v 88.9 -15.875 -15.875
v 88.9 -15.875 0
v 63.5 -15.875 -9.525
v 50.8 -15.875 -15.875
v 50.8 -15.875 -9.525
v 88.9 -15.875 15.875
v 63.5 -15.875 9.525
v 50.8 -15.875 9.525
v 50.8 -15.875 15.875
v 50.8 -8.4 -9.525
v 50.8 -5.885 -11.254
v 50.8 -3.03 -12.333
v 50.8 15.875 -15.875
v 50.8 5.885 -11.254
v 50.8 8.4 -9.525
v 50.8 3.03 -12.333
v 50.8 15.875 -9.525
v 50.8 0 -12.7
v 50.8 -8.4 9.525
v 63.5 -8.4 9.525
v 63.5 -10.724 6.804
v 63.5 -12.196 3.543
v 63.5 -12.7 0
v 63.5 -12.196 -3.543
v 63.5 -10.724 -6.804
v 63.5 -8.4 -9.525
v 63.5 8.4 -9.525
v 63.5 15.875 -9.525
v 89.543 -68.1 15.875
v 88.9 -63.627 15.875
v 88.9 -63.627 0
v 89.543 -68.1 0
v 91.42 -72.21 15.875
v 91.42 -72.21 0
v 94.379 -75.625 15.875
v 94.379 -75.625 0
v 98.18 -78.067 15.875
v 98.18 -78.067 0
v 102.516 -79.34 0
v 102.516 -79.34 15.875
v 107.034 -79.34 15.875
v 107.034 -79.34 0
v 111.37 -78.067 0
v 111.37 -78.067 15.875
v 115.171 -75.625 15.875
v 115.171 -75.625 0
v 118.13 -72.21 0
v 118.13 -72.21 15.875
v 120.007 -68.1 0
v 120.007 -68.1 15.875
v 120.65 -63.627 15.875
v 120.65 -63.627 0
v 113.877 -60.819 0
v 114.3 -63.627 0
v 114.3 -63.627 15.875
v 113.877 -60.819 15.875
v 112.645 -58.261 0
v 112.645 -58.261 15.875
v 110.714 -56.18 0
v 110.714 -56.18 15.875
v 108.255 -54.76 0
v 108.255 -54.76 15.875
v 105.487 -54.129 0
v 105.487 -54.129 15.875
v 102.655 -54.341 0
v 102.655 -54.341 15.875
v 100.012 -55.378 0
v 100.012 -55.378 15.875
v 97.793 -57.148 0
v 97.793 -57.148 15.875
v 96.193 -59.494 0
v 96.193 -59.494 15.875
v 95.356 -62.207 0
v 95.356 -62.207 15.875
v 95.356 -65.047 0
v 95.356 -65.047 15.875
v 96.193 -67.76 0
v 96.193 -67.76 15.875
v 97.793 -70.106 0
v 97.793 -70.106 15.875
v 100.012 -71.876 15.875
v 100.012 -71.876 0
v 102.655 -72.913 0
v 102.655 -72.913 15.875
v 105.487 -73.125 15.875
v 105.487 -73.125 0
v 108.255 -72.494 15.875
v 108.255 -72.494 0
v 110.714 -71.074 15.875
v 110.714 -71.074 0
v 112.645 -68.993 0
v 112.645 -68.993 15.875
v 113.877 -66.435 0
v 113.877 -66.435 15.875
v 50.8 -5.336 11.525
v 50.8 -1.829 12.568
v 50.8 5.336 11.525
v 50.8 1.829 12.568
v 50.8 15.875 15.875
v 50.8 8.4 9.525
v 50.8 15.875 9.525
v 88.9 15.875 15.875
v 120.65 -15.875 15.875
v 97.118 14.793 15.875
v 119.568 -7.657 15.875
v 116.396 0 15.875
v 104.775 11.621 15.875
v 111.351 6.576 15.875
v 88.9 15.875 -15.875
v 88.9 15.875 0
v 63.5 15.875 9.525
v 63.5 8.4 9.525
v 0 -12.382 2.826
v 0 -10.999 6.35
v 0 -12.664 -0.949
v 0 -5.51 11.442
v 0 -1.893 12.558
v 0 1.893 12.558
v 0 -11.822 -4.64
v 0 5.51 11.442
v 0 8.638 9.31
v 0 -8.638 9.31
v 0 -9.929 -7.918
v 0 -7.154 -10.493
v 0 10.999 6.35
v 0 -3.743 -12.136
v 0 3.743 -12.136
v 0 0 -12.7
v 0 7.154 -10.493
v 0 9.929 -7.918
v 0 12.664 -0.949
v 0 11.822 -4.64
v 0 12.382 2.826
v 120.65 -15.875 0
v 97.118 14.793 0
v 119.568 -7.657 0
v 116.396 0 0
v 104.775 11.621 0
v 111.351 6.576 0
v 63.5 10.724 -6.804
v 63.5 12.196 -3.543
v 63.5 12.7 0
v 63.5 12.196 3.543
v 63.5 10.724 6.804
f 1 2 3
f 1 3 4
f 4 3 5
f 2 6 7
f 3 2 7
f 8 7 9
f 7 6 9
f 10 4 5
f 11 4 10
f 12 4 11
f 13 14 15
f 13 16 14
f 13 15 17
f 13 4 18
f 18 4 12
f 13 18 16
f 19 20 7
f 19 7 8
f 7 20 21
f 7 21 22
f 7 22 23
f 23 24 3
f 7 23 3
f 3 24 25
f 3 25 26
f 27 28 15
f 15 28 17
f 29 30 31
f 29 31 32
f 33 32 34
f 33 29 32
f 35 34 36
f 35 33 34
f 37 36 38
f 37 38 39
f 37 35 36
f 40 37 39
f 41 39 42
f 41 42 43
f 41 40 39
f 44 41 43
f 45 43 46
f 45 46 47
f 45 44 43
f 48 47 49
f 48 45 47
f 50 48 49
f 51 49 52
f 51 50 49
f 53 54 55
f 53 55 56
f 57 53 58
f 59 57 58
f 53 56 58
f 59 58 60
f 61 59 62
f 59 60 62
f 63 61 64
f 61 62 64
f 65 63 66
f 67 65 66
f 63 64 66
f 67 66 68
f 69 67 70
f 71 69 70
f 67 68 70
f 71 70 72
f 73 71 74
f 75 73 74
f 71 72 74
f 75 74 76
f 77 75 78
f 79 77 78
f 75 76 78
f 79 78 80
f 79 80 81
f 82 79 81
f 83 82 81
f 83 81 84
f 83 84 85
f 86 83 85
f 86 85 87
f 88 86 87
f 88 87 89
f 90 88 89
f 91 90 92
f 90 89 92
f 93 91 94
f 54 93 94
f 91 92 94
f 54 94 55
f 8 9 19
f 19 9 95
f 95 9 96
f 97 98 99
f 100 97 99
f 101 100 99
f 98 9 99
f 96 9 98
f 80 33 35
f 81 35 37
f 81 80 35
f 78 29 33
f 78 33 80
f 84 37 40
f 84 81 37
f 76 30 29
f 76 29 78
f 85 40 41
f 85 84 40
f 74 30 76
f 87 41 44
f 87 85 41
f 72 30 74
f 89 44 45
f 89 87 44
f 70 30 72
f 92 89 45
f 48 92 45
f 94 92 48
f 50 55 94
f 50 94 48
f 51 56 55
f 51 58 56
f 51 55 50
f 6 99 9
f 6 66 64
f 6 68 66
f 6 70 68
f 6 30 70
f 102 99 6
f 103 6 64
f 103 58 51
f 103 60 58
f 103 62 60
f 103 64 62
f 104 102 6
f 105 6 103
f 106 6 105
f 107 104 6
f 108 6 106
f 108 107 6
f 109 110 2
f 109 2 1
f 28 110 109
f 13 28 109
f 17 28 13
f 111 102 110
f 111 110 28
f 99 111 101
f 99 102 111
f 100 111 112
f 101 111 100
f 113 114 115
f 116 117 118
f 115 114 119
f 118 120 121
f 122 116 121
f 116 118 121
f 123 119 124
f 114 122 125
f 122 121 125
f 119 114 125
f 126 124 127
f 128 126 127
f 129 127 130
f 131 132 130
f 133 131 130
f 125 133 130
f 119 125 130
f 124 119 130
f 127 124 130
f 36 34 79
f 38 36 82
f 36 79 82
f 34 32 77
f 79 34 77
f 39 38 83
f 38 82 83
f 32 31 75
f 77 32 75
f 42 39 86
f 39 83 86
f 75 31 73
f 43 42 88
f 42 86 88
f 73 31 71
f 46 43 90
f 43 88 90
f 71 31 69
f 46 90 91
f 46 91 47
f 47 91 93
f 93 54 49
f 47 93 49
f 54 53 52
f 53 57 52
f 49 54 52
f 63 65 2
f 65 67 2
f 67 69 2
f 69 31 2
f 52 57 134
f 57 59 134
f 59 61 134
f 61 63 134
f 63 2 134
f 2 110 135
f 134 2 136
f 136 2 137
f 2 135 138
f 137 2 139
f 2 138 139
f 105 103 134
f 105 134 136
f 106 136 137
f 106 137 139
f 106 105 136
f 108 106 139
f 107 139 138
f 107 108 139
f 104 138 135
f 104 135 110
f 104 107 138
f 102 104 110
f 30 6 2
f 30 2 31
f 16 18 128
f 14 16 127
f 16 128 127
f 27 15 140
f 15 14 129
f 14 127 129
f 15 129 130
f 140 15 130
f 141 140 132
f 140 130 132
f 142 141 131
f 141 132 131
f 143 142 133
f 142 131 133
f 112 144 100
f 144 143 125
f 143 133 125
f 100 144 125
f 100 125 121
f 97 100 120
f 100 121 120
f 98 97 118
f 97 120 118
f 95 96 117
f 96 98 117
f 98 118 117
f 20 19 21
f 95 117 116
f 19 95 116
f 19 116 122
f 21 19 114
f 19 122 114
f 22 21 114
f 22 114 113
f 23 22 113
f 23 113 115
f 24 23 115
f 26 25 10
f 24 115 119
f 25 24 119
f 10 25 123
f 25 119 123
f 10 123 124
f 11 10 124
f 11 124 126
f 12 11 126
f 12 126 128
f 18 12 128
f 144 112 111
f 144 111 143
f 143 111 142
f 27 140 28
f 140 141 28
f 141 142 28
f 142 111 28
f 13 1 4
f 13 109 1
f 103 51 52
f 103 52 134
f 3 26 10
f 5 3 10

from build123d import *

# Parameters (mm, degrees)
SKETCH2_R           = 12.7
BOSS_EXTRUDE1_DEPTH = 63.5
SKETCH3_W           = 31.75
SKETCH3_H           = 31.75
BOSS_EXTRUDE2_DEPTH = 25.4
SKETCH6_W           = 12.7
SKETCH6_H           = 31.75
BOSS_EXTRUDE3_DEPTH = 6.35
SKETCH7_R           = 9.525
BOSS_EXTRUDE4_DEPTH = 15.875


with BuildPart() as part:
    # Sketch2 → Boss-Extrude1 (new body)
    with BuildSketch(Plane(origin=(0, 0, 0), x_dir=(0, 0, -1), z_dir=(1, 0, 0))):
        Circle(SKETCH2_R)
    extrude(amount=BOSS_EXTRUDE1_DEPTH)

    # Sketch3 → Boss-Extrude2 (add)
    with BuildSketch(Plane(origin=(63.5, 0, 0), x_dir=(0, 0, -1), z_dir=(1, 0, 0))):
        Rectangle(SKETCH3_W, SKETCH3_H)
    extrude(amount=BOSS_EXTRUDE2_DEPTH)

    # Sketch6 → Boss-Extrude3 (add)
    with BuildSketch(Plane(origin=(0, 0, -15.875), x_dir=(-1, 0, 0), z_dir=(0, 0, -1))):
        with Locations((-57.15, 0)):
            Rectangle(SKETCH6_W, SKETCH6_H)
    boss_extrude3 = extrude(amount=-BOSS_EXTRUDE3_DEPTH)

    # Mirror1: Boss-Extrude3 across plane
    add(boss_extrude3.mirror(Plane.XY))

    # Sketch7 → Boss-Extrude4 (add)
    with BuildSketch(Plane.XY.offset(15.875)):
        with BuildLine():
            Line((88.9, 15.875), (88.9, -63.627))
            ThreePointArc((88.9, -63.627), (104.775, -79.502), (120.65, -63.627))
            Line((120.65, -63.627), (120.65, -15.875))
            ThreePointArc((120.65, -15.875), (111.350640303, 6.575640303), (88.9, 15.875))
        make_face()
        with Locations((104.775, -63.627)):
            Circle(SKETCH7_R, mode=Mode.SUBTRACT)
    extrude(amount=-BOSS_EXTRUDE4_DEPTH)


solid = part.part
